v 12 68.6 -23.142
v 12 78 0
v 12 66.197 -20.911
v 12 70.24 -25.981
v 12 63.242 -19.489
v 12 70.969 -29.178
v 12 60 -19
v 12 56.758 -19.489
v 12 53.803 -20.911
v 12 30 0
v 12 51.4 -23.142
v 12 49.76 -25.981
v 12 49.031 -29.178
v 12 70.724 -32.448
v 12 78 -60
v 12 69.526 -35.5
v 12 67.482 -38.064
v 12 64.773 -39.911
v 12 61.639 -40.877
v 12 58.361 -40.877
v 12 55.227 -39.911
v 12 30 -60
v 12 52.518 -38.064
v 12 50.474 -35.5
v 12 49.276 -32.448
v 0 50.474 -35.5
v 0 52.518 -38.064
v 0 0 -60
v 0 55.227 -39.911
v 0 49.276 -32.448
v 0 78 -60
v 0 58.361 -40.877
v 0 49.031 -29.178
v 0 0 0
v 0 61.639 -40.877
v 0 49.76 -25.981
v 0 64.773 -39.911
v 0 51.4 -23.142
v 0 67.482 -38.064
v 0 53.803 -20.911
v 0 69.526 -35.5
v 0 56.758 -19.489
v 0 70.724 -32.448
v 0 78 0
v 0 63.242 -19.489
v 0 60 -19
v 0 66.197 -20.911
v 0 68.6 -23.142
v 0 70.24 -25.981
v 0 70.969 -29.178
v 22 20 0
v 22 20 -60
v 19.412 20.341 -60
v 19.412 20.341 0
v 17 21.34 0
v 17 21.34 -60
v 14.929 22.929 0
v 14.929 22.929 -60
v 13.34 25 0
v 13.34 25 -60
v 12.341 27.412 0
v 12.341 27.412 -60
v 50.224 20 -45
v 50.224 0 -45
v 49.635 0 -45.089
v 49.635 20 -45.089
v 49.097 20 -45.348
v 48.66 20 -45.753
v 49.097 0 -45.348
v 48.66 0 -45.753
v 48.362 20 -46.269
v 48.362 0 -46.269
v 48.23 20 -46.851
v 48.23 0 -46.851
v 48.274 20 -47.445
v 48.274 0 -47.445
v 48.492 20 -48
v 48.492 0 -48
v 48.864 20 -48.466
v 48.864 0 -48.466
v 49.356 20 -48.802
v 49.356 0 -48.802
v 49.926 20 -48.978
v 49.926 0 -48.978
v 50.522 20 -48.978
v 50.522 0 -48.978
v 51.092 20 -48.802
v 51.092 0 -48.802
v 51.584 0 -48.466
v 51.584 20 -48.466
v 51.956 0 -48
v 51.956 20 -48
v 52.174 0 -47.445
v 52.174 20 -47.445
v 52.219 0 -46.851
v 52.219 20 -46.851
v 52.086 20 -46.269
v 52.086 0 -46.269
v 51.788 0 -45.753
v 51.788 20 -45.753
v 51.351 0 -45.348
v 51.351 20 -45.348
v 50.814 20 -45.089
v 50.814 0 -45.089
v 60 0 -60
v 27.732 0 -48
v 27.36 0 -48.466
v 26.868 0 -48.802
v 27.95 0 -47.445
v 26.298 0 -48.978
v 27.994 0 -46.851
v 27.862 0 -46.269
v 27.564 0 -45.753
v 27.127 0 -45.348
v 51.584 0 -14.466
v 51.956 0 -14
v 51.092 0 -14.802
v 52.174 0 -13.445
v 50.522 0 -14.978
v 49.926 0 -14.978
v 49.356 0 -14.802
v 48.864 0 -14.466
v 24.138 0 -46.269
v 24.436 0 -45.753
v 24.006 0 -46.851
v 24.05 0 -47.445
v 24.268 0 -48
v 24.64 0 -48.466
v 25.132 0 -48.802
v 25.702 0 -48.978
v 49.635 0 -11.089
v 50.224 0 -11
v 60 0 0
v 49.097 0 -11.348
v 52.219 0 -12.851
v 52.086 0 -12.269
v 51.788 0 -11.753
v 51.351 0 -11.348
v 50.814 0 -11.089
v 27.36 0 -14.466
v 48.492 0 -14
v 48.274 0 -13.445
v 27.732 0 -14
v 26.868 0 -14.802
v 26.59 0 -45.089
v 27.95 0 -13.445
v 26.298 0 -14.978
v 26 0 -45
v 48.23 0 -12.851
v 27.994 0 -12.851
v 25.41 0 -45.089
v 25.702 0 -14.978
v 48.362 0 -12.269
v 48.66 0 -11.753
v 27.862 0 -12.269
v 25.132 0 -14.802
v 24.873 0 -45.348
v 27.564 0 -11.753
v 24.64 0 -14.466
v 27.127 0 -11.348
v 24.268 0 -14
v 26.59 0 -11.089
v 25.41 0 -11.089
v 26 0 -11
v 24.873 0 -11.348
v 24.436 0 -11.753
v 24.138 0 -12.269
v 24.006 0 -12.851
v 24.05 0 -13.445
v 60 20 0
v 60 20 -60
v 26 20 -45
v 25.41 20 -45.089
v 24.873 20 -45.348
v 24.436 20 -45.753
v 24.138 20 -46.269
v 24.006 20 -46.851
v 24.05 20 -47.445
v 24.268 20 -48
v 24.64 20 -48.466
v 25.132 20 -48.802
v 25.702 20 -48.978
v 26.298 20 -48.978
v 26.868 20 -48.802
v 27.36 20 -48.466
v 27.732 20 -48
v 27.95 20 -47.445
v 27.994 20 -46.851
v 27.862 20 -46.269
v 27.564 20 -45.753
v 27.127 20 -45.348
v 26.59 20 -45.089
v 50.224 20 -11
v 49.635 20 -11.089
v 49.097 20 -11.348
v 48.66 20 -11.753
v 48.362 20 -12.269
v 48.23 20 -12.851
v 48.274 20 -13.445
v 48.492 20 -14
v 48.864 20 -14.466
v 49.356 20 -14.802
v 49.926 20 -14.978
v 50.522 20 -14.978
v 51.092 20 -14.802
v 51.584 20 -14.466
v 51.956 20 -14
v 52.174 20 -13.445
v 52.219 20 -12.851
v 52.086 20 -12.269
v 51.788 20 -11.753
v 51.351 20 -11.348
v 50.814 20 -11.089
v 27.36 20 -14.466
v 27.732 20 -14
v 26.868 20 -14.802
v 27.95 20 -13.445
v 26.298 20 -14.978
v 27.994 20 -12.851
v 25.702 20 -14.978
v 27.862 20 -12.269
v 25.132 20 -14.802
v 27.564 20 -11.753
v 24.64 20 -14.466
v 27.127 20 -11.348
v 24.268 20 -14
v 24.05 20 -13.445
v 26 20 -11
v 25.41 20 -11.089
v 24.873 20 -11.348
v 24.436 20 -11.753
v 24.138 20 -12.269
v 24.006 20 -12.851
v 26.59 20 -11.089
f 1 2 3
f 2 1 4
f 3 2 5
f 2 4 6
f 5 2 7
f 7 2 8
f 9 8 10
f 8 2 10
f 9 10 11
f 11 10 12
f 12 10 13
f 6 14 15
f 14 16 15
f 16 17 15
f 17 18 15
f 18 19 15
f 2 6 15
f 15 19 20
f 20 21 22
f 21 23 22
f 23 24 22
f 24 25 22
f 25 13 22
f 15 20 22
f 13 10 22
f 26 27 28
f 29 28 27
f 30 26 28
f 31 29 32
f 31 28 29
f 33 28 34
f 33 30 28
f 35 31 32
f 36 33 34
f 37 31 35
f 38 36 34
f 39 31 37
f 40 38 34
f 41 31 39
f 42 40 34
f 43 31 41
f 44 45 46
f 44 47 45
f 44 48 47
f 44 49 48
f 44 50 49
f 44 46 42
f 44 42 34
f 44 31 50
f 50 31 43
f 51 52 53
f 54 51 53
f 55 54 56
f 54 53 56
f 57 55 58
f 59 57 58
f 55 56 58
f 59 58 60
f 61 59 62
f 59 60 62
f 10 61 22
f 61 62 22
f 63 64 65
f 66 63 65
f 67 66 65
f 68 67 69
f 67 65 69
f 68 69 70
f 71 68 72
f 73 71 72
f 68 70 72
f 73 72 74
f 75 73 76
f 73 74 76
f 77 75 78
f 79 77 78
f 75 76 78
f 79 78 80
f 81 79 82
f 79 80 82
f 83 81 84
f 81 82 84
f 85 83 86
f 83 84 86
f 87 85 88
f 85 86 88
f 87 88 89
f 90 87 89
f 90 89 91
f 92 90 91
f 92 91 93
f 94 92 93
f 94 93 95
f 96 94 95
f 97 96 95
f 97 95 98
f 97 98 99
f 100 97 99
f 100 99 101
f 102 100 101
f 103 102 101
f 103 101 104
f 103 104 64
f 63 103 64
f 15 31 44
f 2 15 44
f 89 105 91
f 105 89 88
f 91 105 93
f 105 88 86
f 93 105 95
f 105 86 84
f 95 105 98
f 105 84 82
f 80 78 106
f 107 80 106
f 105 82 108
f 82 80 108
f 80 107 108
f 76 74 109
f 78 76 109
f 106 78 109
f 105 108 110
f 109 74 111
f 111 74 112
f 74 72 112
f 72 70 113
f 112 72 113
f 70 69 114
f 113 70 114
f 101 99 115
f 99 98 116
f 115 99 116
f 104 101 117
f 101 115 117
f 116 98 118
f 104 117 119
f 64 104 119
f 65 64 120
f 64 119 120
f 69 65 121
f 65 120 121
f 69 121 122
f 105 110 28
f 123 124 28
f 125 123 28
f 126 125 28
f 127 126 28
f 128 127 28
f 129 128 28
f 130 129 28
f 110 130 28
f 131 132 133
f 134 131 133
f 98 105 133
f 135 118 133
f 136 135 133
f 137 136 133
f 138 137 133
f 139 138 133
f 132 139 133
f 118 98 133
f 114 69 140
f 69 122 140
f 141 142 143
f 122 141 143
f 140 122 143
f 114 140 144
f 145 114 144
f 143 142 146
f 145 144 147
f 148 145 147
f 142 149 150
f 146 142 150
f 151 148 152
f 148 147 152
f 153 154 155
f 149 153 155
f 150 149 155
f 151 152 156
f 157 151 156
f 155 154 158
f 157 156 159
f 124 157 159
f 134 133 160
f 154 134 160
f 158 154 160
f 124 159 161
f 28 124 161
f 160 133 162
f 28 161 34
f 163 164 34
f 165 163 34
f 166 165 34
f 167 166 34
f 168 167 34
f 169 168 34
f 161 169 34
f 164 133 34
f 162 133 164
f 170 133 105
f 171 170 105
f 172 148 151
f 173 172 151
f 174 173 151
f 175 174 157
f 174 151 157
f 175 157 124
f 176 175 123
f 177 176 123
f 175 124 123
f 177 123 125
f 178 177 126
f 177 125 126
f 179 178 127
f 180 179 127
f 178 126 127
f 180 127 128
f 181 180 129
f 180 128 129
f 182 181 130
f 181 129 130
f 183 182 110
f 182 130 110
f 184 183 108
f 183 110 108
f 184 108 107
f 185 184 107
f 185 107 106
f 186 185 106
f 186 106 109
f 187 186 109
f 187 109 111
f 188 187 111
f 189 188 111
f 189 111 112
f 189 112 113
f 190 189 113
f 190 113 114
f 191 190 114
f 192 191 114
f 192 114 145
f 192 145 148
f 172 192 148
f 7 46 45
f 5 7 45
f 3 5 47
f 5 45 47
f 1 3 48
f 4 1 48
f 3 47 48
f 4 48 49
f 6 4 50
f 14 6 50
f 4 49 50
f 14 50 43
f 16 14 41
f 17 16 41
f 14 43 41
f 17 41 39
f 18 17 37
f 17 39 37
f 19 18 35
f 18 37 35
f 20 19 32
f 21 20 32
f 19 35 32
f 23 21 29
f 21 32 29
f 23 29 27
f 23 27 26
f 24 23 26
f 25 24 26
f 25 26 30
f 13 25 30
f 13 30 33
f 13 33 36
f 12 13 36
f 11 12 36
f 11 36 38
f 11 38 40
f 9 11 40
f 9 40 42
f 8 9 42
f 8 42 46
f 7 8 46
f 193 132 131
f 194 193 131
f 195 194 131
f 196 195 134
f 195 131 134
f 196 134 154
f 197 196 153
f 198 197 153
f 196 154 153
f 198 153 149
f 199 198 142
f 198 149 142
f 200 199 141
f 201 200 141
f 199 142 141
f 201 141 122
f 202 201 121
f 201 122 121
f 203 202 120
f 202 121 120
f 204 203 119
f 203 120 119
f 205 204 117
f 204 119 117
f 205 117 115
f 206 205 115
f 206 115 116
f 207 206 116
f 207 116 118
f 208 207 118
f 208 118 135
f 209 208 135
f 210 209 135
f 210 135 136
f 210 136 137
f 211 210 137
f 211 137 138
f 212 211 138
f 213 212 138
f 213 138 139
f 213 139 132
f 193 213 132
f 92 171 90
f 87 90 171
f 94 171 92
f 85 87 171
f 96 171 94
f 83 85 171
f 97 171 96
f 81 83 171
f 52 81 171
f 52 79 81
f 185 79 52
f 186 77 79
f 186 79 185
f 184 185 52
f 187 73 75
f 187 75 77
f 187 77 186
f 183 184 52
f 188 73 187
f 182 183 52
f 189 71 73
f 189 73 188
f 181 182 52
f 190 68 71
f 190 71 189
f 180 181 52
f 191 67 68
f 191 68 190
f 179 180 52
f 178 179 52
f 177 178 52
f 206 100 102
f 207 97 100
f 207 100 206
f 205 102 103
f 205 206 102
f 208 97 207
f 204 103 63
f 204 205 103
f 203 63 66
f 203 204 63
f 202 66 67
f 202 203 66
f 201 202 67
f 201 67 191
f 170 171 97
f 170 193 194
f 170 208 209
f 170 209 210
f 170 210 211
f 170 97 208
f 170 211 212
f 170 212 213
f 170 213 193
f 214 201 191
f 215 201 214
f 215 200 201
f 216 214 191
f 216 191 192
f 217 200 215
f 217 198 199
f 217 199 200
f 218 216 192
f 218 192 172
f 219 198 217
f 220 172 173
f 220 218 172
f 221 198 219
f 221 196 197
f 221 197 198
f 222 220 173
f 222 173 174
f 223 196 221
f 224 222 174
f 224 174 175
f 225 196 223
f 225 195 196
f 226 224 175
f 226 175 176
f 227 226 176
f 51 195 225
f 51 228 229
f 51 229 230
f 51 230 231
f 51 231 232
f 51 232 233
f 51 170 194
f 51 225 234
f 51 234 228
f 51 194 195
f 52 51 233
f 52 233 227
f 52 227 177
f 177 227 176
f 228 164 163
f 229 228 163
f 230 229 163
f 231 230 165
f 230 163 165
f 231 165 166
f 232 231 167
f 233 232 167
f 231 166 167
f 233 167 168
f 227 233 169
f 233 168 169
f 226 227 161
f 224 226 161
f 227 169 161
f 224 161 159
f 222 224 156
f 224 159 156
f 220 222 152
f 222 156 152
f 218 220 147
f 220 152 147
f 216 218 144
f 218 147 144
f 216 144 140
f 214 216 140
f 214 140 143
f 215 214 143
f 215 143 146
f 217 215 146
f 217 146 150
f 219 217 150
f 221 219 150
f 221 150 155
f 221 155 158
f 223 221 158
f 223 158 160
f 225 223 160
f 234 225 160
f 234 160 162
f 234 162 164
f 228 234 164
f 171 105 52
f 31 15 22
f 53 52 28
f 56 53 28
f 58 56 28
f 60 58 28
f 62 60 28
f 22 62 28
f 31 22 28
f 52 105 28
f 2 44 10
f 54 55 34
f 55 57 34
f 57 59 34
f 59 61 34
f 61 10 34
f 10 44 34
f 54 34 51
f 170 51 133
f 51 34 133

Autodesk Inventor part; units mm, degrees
ref_plane "YZ Plane" through (0, 0, 0) normal (1, 0, 0) x (0, 1, 0)
ref_plane "XZ Plane" through (0, 0, 0) normal (0, 1, 0) x (-1, 0, 0)
ref_plane "XY Plane" through (0, 0, 0) normal (0, 0, 1) x (1, 0, 0)
sketch "Эскиз1" plane through (0, 0, 0) normal (0, 1, 0) x (-1, 0, 0)
  line L0 (0, 0) -> (-60, 0)
  line L1 (-60, 0) -> (-60, -60)
  line L2 (-60, -60) -> (0, -60)
  line L3 (0, -60) -> (0, 0)
  dimension "d0" = 60
  dimension "d1" = 60
extrude "Выдавливание1" add sketch "Эскиз1" along normal blind 20
sketch "Эскиз2" plane through (0, 20, 0) normal (0, 1, 0) x (1, 0, 0)
  line L0 (0, 0) -> (60, 0) projected
  line L1 (0, 0) -> (12, 0)
  line L2 (12, 0) -> (12, 60)
  line L3 (60, 60) -> (0, 60) projected
  line L4 (0, 60) -> (0, 0) projected
  line L5 (0, 60) -> (0, 0)
  dimension "d4" = 12
extrude "Выдавливание2" add sketch "Эскиз2" along normal blind 260
sketch "Эскиз3" plane through (0, 20, 0) normal (0, 1, 0) x (1, 0, 0)
  point P0 (0, 0)
  point P1 (26, 13)
  point P2 (26, 47)
  point P3 (50.2241, 13)
  point P4 (50.2241, 47)
hole "Отверстие1" at (26, 20, -13) at (26, 20, -47) at (50.2241, 20, -13) at (50.2241, 20, -47) direction (0, -1, 0) diameter 4 depth 40 tip angle 118
sketch "Эскиз4" plane through (12, 20, 0) normal (1, 0, 0) x (0, 0, -1)
  point P0 (0, -20)
  point P1 (30, 88)
  dimension "d14" = 0
extrude "Выдавливание3" [suppressed]
sketch "Эскиз5" plane through (12, 20, 0) normal (1, 0, 0) x (0, 0, -1)
  point P0 (0, -20)
sketch "Эскиз6" plane through (0, 0, 0) normal (0, 0, 1) x (1, 0, 0)
  line L0 (0, 0) -> (0, 280) projected
  line L1 (12, 20) -> (12, 280) projected
sketch "Эскиз7" plane through (60, 0, -60) normal (0, 0, -1) x (-1, 0, 0)
  point P0 (60, 0)
sketch "Эскиз8" plane through (12, 20, 0) normal (1, 0, 0) x (0, 0, -1)
  circle A0 centre (30, 80) radius 11.5
  point P0 (0, -20)
  point P1 (0, 80)
  dimension "d17" = 23
extrude "Выдавливание4" cut sketch "Эскиз8" against normal blind 100
sketch "Эскиз9" plane through (0, 0, -60) normal (-1, 0, 0) x (0, 0, 1)
  circle A0 centre (29.731, 99.8395) radius 12.5286
  point P0 (60, 0)
  point P1 (0, 80)
extrude "Выдавливание5" add sketch "Эскиз9" against normal blind 12
sketch "Эскиз10" plane through (0, 0, -60) normal (-1, 0, 0) x (0, 0, 1)
  line L0 (0, 0) -> (0, 280) projected
  circle A0 centre (30, 60) radius 11
  circle A1 centre (22, 80) radius 2
  circle A2 centre (38, 80) radius 2
  point P0 (60, 0)
  point P1 (0, 60)
  point P2 (0, 80)
  point P3 (30, 80)
  dimension "d22" = 22
  dimension "d23" = 4
  dimension "d24" = 4
extrude "Выдавливание6" cut sketch "Эскиз10" against normal blind 12
sketch "Эскиз11" plane through (0, 0, 0) normal (0, -1, 0) x (1, 0, 0)
  point P0 (0, 0)
fillet "Сопряжение1" radius 10 1 edges at (12, 20, -30)
sketch "Эскиз12" plane through (0, 0, -60) normal (-1, 0, 0) x (0, 0, 1)
  line L0 (0, 120) -> (60, 120)
  line L1 (60, 120) -> (60, 125)
  line L2 (60, 125) -> (0, 125)
  line L3 (0, 125) -> (0, 120)
  point P0 (60, 0)
  dimension "d28" = 60
  dimension "d29" = 5
extrude "Выдавливание7" add sketch "Эскиз12" against normal blind 50
fillet "Сопряжение2" radius 5 1 edges at (12, 125, -30)
sketch "Эскиз13" plane through (50, 125, 0) normal (0, 1, 0) x (1, 0, 0)
  circle A0 centre (-19, 30) radius 2
  point P0 (-50, 0)
  dimension "d33" = 4
extrude "Выдавливание8" cut sketch "Эскиз13" against normal blind 50
sketch "Эскиз14" plane through (0, 0, -60) normal (-1, 0, 0) x (0, 0, 1)
  line L0 (0, 0) -> (0, 280) projected
  line L1 (0, 145) -> (60, 145)
  line L2 (60, 145) -> (60, 150)
  line L3 (60, 150) -> (0, 150)
  line L4 (0, 150) -> (0, 145)
  point P0 (60, 0)
  dimension "d36" = 60
  dimension "d37" = 5
extrude "Выдавливание9" add sketch "Эскиз14" against normal blind 50
fillet "Сопряжение3" radius 5 1 edges at (12, 150, -30)
sketch "Эскиз15" plane through (12, 145, -60) normal (0, -1, 0) x (1, 0, 0)
  circle A0 centre (19, 30) radius 2 projected
  circle A1 centre (19, 30) radius 2
  circle A2 centre (19, 30) radius 2
  point P0 (-12, 60)
  point P1 (3.4297, 11.4015)
  dimension "d41" = 4
extrude "Выдавливание10" cut sketch "Эскиз15" against normal blind 50
sketch "Эскиз16" plane through (0, 0, -60) normal (-1, 0, 0) x (0, 0, 1)
  line L0 (0, 0) -> (0, 280) projected
  circle A0 centre (30, 215) radius 0.5
  point P0 (60, 0)
  point P1 (0, 215)
  point P2 (0, 215)
  dimension "d44" = 1
extrude "Выдавливание11" cut sketch "Эскиз16" against normal blind 100
sketch "Эскиз17" plane through (12, 280, 0) normal (1, 0, 0) x (0, 0, -1)
  point P0 (0, -280)
sketch "Эскиз18" plane through (12, 280, 0) normal (1, 0, 0) x (0, 0, -1)
  line L0 (0, -125) -> (0, 0) projected
  line L1 (60, -280) -> (60, 0) projected
  line L2 (0, -80) -> (0, -50)
  line L3 (0, -50) -> (5, -50)
  line L4 (5, -50) -> (5, -80)
  line L5 (5, -80) -> (0, -80)
  line L6 (0, -80) -> (0, -50)
  point P0 (0, -280)
  point P1 (30, -80)
  point P2 (30, -50)
  dimension "d47" = 5
extrude "Выдавливание12" add sketch "Эскиз18" along normal blind 44.5
sketch "Эскиз19" plane through (0, 0, 0) normal (0, 0, 1) x (1, 0, 0)
  circle A0 centre (52.5, 223) radius 2
  circle A1 centre (52.5, 207) radius 2
  point P0 (0, 0)
  point P1 (52.5, 215)
  dimension "d50" = 4
  dimension "d51" = 4
extrude "Выдавливание13" cut sketch "Эскиз19" against normal blind 45
fillet "Сопряжение4" radius 10 1 edges at (12, 215, -5)
sketch "Эскиз20" plane through (12, 280, 0) normal (1, 0, 0) x (0, 0, -1)
  line L0 (0, -280) -> (0, 0) projected
  line L1 (0, -50.033) -> (60, -50.033)
  line L2 (60, -280) -> (60, 0) projected
  line L3 (60, -50.033) -> (60, 0)
  line L4 (60, 0) -> (0, 0)
  line L5 (0, 0) -> (0, -50.033)
extrude "Выдавливание14" cut sketch "Эскиз20" against normal blind 100
sketch "Эскиз21" plane through (0, 0, 0) normal (0, 0, 1) x (1, 0, 0)
  line L0 (22, 230) -> (12, 230) projected
  line L1 (22, 200) -> (56.5, 200) projected
  line L2 (12, 230) -> (56.5, 230)
  line L3 (56.5, 230) -> (56.5, 200)
  line L4 (56.5, 200) -> (12, 200)
  line L5 (12, 200) -> (12, 230)
  point P0 (0, 0)
extrude "Выдавливание15" cut sketch "Эскиз21" against normal blind 100
sketch "Эскиз22" plane through (0, 0, -60) normal (-1, 0, 0) x (0, 0, 1)
  circle A0 centre (22, 80) radius 2 projected
  line L0 (60, 0) -> (60, 229.967) projected
  line L1 (0, 0) -> (0, 229.967) projected
  line L2 (0, 30) -> (0, 120) projected
  line L3 (0, 78) -> (60, 78)
  line L4 (60, 155) -> (60, 229.967) projected
  line L5 (60, 78) -> (60, 229.967)
  line L6 (60, 229.967) -> (0, 229.967)
  line L7 (0, 78) -> (0, 229.967)
extrude "Выдавливание16" cut sketch "Эскиз22" against normal blind 100
properties part number "Подпора"
